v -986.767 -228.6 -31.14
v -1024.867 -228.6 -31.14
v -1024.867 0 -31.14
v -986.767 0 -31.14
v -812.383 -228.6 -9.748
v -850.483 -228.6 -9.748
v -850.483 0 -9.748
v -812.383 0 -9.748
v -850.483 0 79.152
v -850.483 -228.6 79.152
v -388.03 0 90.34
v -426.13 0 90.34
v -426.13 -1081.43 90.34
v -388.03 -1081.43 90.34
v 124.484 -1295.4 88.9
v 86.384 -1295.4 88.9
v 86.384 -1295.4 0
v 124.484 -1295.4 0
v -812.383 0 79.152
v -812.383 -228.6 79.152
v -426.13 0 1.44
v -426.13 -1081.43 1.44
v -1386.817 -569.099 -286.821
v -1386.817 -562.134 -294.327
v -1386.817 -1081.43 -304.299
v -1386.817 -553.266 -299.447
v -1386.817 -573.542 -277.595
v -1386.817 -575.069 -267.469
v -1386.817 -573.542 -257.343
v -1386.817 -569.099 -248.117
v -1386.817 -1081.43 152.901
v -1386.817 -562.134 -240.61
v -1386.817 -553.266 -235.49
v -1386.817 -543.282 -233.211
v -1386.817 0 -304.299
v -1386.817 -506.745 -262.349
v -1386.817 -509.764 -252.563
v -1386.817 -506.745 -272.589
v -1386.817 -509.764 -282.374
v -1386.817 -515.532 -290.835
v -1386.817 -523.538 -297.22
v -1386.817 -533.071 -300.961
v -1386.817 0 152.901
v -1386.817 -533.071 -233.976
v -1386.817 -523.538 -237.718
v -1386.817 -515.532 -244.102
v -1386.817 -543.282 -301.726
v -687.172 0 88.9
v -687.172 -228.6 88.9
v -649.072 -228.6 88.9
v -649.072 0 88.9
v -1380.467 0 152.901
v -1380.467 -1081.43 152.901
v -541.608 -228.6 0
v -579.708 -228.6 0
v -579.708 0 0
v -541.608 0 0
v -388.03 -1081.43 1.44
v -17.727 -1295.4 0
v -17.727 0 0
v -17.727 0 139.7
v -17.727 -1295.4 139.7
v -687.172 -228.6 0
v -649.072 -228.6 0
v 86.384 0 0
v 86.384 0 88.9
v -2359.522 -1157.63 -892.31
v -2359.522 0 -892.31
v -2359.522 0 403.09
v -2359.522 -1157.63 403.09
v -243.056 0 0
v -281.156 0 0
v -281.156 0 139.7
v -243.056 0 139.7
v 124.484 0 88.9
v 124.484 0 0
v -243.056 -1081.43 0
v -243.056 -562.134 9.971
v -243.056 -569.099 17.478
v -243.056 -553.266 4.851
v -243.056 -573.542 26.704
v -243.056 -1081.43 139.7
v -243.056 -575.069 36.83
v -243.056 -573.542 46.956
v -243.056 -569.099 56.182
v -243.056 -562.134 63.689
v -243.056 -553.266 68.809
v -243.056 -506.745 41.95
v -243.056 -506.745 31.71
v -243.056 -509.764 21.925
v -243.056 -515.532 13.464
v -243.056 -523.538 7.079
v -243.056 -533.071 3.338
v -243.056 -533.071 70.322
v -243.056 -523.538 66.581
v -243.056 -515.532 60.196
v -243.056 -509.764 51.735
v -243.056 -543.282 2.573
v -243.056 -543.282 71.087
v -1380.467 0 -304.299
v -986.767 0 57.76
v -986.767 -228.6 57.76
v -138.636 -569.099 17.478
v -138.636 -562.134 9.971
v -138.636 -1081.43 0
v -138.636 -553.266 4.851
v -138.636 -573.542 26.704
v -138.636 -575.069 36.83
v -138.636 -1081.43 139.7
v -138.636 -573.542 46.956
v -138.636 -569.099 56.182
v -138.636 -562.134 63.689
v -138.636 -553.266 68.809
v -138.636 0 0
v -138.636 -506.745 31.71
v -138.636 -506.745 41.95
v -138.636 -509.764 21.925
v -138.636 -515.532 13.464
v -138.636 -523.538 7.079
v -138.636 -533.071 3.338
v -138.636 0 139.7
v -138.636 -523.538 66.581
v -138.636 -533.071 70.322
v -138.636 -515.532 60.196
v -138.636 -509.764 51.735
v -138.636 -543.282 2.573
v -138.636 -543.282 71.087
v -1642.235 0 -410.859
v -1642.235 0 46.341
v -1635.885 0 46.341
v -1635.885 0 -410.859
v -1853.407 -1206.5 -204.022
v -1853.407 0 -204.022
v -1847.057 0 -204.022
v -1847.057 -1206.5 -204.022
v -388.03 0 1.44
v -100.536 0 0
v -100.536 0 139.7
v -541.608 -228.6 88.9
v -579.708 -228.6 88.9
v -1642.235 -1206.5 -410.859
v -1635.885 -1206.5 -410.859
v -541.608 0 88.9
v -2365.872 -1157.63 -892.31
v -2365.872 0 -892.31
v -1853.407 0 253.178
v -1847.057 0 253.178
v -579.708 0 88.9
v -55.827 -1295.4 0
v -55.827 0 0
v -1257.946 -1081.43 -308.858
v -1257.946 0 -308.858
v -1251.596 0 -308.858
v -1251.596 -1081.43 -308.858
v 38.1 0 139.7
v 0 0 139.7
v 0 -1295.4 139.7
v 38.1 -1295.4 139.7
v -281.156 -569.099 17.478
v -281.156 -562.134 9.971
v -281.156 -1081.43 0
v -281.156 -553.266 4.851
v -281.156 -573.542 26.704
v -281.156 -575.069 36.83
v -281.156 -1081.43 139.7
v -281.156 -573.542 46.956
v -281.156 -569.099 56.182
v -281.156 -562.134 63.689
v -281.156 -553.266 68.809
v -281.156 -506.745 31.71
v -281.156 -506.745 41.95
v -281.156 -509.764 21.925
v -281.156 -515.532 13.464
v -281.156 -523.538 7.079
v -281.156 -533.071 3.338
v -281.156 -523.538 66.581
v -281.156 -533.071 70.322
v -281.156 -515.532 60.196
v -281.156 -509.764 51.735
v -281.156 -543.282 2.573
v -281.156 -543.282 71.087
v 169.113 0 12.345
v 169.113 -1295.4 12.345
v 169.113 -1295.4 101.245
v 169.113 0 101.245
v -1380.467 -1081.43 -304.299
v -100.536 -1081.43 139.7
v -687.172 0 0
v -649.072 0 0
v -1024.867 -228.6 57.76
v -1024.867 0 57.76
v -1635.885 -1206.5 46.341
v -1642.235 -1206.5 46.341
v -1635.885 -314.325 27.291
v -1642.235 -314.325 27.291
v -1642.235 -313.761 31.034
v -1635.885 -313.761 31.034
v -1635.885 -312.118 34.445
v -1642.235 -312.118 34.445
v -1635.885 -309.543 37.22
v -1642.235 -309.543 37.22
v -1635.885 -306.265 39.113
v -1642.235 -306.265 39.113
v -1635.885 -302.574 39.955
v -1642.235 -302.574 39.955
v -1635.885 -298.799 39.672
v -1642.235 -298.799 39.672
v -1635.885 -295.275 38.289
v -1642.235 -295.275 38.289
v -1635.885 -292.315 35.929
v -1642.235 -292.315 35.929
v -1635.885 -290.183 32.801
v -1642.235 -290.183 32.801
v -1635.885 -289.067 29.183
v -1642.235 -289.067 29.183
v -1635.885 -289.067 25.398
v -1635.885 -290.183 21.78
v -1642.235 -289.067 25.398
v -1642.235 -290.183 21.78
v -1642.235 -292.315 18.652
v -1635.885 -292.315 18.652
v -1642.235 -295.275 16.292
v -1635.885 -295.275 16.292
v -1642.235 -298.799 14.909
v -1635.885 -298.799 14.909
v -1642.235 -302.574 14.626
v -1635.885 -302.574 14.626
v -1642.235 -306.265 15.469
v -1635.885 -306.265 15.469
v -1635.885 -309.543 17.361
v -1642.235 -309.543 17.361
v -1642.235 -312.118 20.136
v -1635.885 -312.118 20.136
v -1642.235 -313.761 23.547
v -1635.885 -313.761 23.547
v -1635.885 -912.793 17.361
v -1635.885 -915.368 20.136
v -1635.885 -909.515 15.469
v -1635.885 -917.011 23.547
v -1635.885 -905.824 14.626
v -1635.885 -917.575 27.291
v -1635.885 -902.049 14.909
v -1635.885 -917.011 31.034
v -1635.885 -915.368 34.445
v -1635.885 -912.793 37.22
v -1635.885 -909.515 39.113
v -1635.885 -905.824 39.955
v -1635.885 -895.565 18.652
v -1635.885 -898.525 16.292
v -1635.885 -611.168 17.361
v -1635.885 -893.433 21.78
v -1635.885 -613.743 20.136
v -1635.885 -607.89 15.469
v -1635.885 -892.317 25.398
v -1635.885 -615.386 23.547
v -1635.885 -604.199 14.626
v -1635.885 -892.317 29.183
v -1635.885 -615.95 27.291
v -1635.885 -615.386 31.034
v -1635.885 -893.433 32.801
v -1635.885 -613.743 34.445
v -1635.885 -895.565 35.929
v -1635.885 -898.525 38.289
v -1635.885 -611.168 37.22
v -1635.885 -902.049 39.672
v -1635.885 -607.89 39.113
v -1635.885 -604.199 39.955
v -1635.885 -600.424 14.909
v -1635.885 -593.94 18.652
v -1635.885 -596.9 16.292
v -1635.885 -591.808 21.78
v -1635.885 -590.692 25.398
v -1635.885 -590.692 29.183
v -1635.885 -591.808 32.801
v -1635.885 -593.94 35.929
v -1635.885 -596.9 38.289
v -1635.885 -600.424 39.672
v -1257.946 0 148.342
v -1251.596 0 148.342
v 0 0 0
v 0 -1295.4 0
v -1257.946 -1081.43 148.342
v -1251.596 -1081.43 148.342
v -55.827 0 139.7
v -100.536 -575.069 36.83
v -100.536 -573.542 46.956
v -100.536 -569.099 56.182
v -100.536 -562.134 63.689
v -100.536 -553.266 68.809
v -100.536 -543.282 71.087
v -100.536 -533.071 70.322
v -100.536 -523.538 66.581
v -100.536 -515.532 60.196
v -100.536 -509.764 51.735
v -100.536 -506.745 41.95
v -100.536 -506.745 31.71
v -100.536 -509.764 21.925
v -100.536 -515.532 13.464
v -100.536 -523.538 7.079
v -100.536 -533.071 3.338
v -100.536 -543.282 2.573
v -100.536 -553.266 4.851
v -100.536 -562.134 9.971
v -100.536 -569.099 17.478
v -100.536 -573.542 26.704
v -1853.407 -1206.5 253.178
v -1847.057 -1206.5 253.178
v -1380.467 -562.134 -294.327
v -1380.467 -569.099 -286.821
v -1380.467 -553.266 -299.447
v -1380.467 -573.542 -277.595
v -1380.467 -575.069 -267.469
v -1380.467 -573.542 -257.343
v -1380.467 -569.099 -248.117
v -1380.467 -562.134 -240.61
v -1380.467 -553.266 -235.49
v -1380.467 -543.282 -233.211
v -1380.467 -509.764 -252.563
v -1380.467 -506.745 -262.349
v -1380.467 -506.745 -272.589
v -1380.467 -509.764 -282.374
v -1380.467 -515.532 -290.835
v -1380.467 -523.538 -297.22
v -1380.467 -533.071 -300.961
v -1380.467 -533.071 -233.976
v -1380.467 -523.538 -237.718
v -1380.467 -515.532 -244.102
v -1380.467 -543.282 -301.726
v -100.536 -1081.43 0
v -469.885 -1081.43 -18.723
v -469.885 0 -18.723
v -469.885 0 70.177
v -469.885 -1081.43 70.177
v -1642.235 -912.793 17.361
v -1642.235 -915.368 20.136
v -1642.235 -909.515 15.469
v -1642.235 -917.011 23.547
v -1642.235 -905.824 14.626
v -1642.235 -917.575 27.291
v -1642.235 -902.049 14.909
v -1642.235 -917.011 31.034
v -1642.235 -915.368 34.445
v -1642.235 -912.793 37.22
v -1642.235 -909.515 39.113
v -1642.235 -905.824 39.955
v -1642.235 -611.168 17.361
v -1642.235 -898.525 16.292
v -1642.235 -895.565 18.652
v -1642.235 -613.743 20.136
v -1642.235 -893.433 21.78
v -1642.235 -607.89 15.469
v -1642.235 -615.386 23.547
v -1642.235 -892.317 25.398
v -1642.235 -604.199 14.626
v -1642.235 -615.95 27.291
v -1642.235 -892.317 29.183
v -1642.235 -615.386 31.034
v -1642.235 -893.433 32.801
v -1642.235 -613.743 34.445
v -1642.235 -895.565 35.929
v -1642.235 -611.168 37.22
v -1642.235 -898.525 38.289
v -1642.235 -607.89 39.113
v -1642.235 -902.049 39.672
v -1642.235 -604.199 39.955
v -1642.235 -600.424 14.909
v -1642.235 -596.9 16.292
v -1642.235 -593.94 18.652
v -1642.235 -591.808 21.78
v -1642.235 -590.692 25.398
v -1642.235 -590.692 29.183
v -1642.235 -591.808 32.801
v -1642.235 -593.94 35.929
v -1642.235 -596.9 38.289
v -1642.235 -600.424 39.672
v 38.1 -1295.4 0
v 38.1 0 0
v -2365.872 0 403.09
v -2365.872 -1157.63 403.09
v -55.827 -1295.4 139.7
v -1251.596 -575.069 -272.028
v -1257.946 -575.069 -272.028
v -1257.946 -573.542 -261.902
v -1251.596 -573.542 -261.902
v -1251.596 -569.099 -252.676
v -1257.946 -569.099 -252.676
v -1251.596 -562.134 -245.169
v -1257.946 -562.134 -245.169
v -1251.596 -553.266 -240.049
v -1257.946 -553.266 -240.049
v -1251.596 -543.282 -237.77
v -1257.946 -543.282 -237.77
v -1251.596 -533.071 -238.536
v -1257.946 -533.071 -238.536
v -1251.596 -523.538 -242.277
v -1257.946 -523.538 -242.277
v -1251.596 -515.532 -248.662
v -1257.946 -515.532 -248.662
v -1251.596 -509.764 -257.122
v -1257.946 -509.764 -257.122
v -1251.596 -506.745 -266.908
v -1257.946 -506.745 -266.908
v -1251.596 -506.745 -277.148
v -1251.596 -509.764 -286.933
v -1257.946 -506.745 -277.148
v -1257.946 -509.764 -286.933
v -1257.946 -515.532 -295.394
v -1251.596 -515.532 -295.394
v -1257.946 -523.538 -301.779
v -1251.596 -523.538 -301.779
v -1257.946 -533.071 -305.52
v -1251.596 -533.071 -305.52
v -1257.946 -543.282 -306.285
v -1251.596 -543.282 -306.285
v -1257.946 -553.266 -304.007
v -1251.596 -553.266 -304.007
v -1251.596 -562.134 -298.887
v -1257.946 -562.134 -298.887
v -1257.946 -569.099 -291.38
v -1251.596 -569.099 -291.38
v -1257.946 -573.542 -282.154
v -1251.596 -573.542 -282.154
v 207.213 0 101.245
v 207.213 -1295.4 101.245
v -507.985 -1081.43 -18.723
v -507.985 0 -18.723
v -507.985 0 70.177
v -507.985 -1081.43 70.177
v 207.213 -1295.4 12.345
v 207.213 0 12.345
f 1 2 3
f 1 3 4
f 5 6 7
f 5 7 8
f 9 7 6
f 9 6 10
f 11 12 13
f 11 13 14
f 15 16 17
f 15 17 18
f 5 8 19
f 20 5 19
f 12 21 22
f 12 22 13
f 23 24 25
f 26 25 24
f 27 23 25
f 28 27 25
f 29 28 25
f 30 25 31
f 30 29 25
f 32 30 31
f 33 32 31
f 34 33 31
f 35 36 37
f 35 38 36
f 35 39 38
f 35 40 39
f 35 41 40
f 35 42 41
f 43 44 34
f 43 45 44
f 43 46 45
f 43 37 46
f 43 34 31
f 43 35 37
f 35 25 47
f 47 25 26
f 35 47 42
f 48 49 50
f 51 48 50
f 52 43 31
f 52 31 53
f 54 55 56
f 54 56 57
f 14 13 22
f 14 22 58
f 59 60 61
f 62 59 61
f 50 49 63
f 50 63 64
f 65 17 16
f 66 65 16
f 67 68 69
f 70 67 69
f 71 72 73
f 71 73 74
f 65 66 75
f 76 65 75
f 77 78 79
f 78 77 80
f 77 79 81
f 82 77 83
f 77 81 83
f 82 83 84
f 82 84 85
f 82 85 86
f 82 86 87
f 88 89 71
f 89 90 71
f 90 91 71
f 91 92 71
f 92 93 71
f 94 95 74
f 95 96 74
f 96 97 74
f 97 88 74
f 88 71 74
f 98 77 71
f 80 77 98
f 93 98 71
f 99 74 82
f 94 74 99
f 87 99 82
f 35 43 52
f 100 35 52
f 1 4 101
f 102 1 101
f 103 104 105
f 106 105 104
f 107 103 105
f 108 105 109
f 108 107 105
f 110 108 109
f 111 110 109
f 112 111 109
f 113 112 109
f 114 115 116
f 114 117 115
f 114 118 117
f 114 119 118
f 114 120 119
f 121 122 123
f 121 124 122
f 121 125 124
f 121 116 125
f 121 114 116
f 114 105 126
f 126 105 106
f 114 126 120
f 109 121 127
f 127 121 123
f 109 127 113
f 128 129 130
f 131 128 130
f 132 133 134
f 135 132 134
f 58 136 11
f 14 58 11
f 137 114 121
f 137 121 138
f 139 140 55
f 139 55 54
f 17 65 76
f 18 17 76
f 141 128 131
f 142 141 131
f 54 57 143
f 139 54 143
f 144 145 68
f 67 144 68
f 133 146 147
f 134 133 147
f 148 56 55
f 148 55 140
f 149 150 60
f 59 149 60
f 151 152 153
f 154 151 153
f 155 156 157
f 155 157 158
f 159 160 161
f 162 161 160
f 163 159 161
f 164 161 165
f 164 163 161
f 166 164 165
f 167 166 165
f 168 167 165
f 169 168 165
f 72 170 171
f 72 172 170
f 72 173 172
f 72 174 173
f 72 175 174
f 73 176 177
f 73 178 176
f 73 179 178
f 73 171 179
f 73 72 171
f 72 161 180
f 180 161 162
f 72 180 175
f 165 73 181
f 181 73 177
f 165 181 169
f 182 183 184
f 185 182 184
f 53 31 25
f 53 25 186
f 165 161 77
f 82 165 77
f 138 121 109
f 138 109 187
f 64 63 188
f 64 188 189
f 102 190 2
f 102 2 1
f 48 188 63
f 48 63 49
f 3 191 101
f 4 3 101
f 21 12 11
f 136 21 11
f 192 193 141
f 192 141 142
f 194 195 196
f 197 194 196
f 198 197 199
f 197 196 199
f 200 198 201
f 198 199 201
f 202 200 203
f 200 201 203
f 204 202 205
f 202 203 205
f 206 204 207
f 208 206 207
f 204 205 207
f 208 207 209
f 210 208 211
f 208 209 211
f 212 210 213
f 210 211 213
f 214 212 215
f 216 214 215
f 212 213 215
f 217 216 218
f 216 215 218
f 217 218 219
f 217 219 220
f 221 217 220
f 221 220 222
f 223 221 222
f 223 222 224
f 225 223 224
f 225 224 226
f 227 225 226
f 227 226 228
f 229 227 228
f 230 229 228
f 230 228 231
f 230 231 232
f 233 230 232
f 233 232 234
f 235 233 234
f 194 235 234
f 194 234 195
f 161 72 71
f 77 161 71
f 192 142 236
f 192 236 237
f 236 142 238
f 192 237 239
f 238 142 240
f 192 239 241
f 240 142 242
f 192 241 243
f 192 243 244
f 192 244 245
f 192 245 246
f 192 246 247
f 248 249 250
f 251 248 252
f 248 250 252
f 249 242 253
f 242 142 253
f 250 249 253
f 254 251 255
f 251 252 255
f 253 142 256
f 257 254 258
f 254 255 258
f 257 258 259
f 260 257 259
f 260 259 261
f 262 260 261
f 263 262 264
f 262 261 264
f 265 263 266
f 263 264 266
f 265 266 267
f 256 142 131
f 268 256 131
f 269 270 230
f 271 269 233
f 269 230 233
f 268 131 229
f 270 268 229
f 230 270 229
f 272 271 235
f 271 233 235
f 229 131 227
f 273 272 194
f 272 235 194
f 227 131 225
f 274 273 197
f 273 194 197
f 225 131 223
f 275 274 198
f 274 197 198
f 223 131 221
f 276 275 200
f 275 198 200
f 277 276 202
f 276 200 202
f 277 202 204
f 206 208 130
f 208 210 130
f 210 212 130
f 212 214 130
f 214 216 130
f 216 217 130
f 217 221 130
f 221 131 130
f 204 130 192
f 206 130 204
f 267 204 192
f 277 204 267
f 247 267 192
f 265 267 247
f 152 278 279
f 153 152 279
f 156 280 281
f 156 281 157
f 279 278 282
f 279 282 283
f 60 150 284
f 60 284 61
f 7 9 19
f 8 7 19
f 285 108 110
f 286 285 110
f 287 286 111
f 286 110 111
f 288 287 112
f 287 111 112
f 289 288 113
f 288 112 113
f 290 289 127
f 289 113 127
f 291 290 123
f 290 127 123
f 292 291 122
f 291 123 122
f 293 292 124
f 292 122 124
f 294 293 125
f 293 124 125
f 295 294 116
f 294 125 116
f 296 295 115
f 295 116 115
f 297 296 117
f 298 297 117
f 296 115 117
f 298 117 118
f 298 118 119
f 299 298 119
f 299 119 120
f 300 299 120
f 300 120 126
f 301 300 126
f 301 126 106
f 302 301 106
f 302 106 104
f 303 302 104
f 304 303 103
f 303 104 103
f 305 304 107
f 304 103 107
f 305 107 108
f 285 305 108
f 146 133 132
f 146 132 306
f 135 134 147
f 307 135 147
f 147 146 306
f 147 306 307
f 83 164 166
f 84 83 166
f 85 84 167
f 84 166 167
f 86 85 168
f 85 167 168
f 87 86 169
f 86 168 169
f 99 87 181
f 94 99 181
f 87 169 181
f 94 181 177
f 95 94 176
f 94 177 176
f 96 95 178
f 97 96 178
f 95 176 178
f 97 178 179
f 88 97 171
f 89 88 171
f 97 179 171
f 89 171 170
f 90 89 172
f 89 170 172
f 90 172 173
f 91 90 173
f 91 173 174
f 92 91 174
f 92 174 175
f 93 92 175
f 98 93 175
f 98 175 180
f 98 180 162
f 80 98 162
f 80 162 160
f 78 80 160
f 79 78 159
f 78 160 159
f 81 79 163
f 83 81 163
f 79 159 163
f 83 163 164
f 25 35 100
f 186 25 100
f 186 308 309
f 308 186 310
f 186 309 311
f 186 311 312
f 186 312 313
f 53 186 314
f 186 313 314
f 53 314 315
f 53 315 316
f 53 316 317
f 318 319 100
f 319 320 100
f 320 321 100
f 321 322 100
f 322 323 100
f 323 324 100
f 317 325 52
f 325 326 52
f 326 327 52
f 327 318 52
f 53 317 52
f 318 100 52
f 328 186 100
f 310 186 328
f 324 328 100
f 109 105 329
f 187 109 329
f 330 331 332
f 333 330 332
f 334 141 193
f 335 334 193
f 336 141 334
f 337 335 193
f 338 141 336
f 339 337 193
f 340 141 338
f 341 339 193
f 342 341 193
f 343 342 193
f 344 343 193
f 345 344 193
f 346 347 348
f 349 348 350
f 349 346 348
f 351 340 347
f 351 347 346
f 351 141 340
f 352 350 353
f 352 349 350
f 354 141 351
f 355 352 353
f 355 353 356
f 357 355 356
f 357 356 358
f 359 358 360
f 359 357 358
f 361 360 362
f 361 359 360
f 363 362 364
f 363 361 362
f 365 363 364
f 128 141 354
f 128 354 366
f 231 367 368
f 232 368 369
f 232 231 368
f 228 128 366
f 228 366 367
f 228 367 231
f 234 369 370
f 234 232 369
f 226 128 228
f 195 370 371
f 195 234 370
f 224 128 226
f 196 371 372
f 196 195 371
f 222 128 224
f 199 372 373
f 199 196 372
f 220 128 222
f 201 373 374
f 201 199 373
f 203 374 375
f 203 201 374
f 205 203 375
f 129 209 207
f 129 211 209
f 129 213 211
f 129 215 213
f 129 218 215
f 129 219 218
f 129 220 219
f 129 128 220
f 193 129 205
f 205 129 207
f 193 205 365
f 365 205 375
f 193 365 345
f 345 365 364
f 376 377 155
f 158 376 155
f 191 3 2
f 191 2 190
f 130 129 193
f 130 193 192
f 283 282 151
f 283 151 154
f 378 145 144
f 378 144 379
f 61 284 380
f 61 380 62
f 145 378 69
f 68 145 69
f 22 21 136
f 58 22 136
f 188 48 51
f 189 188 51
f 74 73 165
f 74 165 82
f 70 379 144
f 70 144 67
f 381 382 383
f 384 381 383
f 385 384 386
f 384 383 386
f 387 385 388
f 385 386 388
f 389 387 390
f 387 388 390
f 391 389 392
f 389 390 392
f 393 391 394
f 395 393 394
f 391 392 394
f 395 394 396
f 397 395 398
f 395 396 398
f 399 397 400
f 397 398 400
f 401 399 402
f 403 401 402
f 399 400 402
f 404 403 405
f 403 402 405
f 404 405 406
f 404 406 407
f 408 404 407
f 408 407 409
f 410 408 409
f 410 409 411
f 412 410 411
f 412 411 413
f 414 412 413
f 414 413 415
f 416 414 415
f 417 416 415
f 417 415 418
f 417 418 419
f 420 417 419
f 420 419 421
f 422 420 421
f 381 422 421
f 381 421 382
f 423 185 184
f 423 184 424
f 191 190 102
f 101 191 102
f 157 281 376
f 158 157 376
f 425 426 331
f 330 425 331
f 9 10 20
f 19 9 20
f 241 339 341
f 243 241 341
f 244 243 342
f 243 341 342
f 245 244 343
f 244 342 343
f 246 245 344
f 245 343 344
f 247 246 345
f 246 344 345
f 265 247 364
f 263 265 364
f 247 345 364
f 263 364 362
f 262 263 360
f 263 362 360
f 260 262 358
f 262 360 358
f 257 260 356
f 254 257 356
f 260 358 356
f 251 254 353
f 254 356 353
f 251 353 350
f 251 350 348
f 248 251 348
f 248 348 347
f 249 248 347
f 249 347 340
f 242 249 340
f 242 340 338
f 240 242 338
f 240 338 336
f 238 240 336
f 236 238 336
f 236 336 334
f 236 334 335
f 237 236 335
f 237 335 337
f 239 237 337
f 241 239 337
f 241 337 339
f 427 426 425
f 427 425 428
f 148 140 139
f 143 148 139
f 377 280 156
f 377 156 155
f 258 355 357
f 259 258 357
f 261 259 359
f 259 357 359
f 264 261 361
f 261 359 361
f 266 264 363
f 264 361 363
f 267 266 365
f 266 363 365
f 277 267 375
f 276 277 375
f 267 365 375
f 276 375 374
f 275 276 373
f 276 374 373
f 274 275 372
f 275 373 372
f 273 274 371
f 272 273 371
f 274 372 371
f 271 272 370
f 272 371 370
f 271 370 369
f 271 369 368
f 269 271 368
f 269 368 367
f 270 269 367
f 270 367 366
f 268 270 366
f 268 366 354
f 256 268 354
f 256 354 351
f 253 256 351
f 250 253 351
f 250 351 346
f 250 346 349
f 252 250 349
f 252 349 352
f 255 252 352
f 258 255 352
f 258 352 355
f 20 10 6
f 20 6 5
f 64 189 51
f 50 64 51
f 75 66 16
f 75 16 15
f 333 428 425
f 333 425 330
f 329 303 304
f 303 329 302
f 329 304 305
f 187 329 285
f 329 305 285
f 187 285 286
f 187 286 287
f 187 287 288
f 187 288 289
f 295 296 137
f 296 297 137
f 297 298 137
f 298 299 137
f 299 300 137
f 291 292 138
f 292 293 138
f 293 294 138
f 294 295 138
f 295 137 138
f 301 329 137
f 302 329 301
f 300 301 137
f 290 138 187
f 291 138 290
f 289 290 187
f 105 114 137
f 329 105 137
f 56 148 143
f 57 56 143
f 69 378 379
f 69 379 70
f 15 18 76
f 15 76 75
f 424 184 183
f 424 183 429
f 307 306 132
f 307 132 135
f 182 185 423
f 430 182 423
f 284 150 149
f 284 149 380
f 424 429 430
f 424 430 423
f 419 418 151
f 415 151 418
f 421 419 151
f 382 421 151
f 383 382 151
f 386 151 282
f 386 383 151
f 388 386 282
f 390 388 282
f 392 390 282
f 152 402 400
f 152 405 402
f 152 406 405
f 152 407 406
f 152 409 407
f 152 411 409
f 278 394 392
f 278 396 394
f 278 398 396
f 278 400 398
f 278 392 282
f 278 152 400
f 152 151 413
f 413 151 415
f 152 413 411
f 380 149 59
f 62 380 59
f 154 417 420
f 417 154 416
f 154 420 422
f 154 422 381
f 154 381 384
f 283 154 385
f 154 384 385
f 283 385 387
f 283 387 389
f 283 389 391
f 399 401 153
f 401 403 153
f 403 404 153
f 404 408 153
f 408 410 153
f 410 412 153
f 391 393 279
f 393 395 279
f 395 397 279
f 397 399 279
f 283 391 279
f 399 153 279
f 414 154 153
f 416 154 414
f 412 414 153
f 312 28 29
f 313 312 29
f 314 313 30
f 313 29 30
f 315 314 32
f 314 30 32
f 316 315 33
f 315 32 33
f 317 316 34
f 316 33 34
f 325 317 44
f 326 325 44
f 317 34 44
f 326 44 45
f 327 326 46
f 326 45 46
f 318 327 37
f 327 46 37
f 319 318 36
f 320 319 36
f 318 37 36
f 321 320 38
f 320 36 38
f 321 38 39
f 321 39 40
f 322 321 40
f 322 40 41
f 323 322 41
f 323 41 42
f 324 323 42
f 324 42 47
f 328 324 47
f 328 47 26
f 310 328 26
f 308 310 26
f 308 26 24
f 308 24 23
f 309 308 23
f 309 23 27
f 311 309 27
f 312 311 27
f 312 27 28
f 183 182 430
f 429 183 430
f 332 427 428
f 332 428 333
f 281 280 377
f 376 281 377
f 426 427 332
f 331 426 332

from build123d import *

# Parameters (mm, degrees)
F0_W      = 38.1
F0_H      = 139.7
F1_DEPTH  = 1295.4
F2_W      = 38.1
F2_H      = 139.7
F3_DEPTH  = 1295.4
F4_W      = 38.1
F4_H      = 139.7
F5_DEPTH  = 1081.4304
F6_W      = 38.1
F6_H      = 139.7
F7_DEPTH  = 1081.4304
F8_W      = 38.1
F8_H      = 88.9
F9_DEPTH  = 1081.4304
F10_W     = 38.1
F10_H     = 88.9
F11_DEPTH = 1081.4304
F12_W     = 38.1
F12_H     = 88.9
F13_DEPTH = 1295.4
F14_W     = 38.1
F14_H     = 88.9
F15_DEPTH = 1295.4
F16_W     = 38.1
F16_H     = 88.9
F17_DEPTH = 228.6
F18_W     = 38.1
F18_H     = 88.9
F19_DEPTH = 228.6
F20_W     = 38.1
F20_H     = 88.9
F21_DEPTH = 228.6
F22_W     = 38.1
F22_H     = 88.9
F23_DEPTH = 228.6
F24_W     = 6.35
F24_H     = 457.2
F25_DEPTH = 1081.4304
F26_W     = 6.35
F26_H     = 457.2
F27_DEPTH = 1081.4304
F28_W     = 6.35
F28_H     = 457.2
F29_DEPTH = 1206.5
F30_W     = 6.35
F30_H     = 457.2
F31_DEPTH = 1206.5
F32_W     = 6.35
F32_H     = 1295.4
F33_DEPTH = 1157.6304
F34_R     = 34.3535
F35_DEPTH = 38.1
F36_R     = 34.3535
F37_DEPTH = 38.1
F38_R     = 34.3535
F39_DEPTH = 25.4
F40_R     = 34.3535
F41_DEPTH = 25.4
F42_R     = 12.7
F43_DEPTH = 25.4


with BuildPart() as f1:
    # F0 (on Front) → F1 (new body)
    with BuildSketch(Plane.XZ):
        with Locations((19.05, 69.85)):
            Rectangle(F0_W, F0_H)
    extrude(amount=F1_DEPTH)


with BuildPart() as f3:
    # F2 (on Front) → F3 (new body)
    with BuildSketch(Plane.XZ):
        with Locations((-36.776635, 69.85)):
            Rectangle(F2_W, F2_H)
    extrude(amount=F3_DEPTH)


with BuildPart() as f5:
    # F4 (on Front) → F5 (new body)
    with BuildSketch(Plane.XZ):
        with Locations((-119.586432, 69.85)):
            Rectangle(F4_W, F4_H)
    extrude(amount=F5_DEPTH)

    # F36 (on face) → F37 (cut)
    with BuildSketch(Plane(origin=(-138.636432, 0, 0), x_dir=(0, -1, 0), z_dir=(-1, 0, 0))):
        with Locations((540.7152, 36.83)):
            Circle(F36_R)
    extrude(amount=-F37_DEPTH, mode=Mode.SUBTRACT)


with BuildPart() as f7:
    # F6 (on Front) → F7 (new body)
    with BuildSketch(Plane.XZ):
        with Locations((-262.106378, 69.85)):
            Rectangle(F6_W, F6_H)
    extrude(amount=F7_DEPTH)

    # F34 (on face) → F35 (cut)
    with BuildSketch(Plane(origin=(-281.156378, 0, 0), x_dir=(0, -1, 0), z_dir=(-1, 0, 0))):
        with Locations((540.7152, 36.83)):
            Circle(F34_R)
    extrude(amount=-F35_DEPTH, mode=Mode.SUBTRACT)


with BuildPart() as f9:
    # F8 (on Front) → F9 (new body)
    with BuildSketch(Plane.XZ):
        with Locations((-488.934726, 25.726853)):
            Rectangle(F8_W, F8_H)
    extrude(amount=F9_DEPTH)


with BuildPart() as f11:
    # F10 (on Front) → F11 (new body)
    with BuildSketch(Plane.XZ):
        with Locations((-407.079831, 45.890186)):
            Rectangle(F10_W, F10_H)
    extrude(amount=F11_DEPTH)


with BuildPart() as f13:
    # F12 (on Front) → F13 (new body)
    with BuildSketch(Plane.XZ):
        with Locations((105.433971, 44.45)):
            Rectangle(F12_W, F12_H)
    extrude(amount=F13_DEPTH)


with BuildPart() as f15:
    # F14 (on Front) → F15 (new body)
    with BuildSketch(Plane.XZ):
        with Locations((188.163266, 56.794696)):
            Rectangle(F14_W, F14_H)
    extrude(amount=F15_DEPTH)


with BuildPart() as f17:
    # F16 (on Front) → F17 (new body)
    with BuildSketch(Plane.XZ):
        with Locations((-668.121522, 44.45)):
            Rectangle(F16_W, F16_H)
    extrude(amount=F17_DEPTH)


with BuildPart() as f19:
    # F18 (on Front) → F19 (new body)
    with BuildSketch(Plane.XZ):
        with Locations((-560.658494, 44.45)):
            Rectangle(F18_W, F18_H)
    extrude(amount=F19_DEPTH)


with BuildPart() as f21:
    # F20 (on Front) → F21 (new body)
    with BuildSketch(Plane.XZ):
        with Locations((-1005.817004, 13.310429)):
            Rectangle(F20_W, F20_H)
    extrude(amount=F21_DEPTH)


with BuildPart() as f23:
    # F22 (on Front) → F23 (new body)
    with BuildSketch(Plane.XZ):
        with Locations((-831.432849, 34.70206)):
            Rectangle(F22_W, F22_H)
    extrude(amount=F23_DEPTH)


with BuildPart() as f25:
    # F24 (on Front) → F25 (new body)
    with BuildSketch(Plane.XZ):
        with Locations((-1254.771391, -80.257863)):
            Rectangle(F24_W, F24_H)
    extrude(amount=F25_DEPTH)

    # F38 (on face) → F39 (cut)
    with BuildSketch(Plane(origin=(-1257.946391, 0, 0), x_dir=(0, -1, 0), z_dir=(-1, 0, 0))):
        with Locations((540.7152, -272.027863)):
            Circle(F38_R)
    extrude(amount=-F39_DEPTH, mode=Mode.SUBTRACT)


with BuildPart() as f27:
    # F26 (on Front) → F27 (new body)
    with BuildSketch(Plane.XZ):
        with Locations((-1383.641836, -75.698666)):
            Rectangle(F26_W, F26_H)
    extrude(amount=F27_DEPTH)

    # F40 (on face) → F41 (cut)
    with BuildSketch(Plane(origin=(-1386.816836, 0, 0), x_dir=(0, -1, 0), z_dir=(-1, 0, 0))):
        with Locations((540.7152, -267.468666)):
            Circle(F40_R)
    extrude(amount=-F41_DEPTH, mode=Mode.SUBTRACT)


with BuildPart() as f29:
    # F28 (on Front) → F29 (new body)
    with BuildSketch(Plane.XZ):
        with Locations((-1639.059727, -182.259366)):
            Rectangle(F28_W, F28_H)
    extrude(amount=F29_DEPTH)

    # F42 (on face) → F43 (cut)
    with BuildSketch(Plane(origin=(-1642.234727, 0, 0), x_dir=(0, -1, 0), z_dir=(-1, 0, 0))):
        with Locations((301.625, 27.290634)):
            Circle(F42_R)
        with Locations((603.25, 27.290634)):
            Circle(F42_R)
        with Locations((904.875, 27.290634)):
            Circle(F42_R)
    extrude(amount=-F43_DEPTH, mode=Mode.SUBTRACT)


with BuildPart() as f31:
    # F30 (on Front) → F31 (new body)
    with BuildSketch(Plane.XZ):
        with Locations((-1850.231946, 24.577563)):
            Rectangle(F30_W, F30_H)
    extrude(amount=F31_DEPTH)


with BuildPart() as f33:
    # F32 (on Front) → F33 (new body)
    with BuildSketch(Plane.XZ):
        with Locations((-2362.697432, -244.610153)):
            Rectangle(F32_W, F32_H)
    extrude(amount=F33_DEPTH)


solid = Compound([f1.part, f3.part, f5.part, f7.part, f9.part, f11.part, f13.part, f15.part, f17.part, f19.part, f21.part, f23.part, f25.part, f27.part, f29.part, f31.part, f33.part])
